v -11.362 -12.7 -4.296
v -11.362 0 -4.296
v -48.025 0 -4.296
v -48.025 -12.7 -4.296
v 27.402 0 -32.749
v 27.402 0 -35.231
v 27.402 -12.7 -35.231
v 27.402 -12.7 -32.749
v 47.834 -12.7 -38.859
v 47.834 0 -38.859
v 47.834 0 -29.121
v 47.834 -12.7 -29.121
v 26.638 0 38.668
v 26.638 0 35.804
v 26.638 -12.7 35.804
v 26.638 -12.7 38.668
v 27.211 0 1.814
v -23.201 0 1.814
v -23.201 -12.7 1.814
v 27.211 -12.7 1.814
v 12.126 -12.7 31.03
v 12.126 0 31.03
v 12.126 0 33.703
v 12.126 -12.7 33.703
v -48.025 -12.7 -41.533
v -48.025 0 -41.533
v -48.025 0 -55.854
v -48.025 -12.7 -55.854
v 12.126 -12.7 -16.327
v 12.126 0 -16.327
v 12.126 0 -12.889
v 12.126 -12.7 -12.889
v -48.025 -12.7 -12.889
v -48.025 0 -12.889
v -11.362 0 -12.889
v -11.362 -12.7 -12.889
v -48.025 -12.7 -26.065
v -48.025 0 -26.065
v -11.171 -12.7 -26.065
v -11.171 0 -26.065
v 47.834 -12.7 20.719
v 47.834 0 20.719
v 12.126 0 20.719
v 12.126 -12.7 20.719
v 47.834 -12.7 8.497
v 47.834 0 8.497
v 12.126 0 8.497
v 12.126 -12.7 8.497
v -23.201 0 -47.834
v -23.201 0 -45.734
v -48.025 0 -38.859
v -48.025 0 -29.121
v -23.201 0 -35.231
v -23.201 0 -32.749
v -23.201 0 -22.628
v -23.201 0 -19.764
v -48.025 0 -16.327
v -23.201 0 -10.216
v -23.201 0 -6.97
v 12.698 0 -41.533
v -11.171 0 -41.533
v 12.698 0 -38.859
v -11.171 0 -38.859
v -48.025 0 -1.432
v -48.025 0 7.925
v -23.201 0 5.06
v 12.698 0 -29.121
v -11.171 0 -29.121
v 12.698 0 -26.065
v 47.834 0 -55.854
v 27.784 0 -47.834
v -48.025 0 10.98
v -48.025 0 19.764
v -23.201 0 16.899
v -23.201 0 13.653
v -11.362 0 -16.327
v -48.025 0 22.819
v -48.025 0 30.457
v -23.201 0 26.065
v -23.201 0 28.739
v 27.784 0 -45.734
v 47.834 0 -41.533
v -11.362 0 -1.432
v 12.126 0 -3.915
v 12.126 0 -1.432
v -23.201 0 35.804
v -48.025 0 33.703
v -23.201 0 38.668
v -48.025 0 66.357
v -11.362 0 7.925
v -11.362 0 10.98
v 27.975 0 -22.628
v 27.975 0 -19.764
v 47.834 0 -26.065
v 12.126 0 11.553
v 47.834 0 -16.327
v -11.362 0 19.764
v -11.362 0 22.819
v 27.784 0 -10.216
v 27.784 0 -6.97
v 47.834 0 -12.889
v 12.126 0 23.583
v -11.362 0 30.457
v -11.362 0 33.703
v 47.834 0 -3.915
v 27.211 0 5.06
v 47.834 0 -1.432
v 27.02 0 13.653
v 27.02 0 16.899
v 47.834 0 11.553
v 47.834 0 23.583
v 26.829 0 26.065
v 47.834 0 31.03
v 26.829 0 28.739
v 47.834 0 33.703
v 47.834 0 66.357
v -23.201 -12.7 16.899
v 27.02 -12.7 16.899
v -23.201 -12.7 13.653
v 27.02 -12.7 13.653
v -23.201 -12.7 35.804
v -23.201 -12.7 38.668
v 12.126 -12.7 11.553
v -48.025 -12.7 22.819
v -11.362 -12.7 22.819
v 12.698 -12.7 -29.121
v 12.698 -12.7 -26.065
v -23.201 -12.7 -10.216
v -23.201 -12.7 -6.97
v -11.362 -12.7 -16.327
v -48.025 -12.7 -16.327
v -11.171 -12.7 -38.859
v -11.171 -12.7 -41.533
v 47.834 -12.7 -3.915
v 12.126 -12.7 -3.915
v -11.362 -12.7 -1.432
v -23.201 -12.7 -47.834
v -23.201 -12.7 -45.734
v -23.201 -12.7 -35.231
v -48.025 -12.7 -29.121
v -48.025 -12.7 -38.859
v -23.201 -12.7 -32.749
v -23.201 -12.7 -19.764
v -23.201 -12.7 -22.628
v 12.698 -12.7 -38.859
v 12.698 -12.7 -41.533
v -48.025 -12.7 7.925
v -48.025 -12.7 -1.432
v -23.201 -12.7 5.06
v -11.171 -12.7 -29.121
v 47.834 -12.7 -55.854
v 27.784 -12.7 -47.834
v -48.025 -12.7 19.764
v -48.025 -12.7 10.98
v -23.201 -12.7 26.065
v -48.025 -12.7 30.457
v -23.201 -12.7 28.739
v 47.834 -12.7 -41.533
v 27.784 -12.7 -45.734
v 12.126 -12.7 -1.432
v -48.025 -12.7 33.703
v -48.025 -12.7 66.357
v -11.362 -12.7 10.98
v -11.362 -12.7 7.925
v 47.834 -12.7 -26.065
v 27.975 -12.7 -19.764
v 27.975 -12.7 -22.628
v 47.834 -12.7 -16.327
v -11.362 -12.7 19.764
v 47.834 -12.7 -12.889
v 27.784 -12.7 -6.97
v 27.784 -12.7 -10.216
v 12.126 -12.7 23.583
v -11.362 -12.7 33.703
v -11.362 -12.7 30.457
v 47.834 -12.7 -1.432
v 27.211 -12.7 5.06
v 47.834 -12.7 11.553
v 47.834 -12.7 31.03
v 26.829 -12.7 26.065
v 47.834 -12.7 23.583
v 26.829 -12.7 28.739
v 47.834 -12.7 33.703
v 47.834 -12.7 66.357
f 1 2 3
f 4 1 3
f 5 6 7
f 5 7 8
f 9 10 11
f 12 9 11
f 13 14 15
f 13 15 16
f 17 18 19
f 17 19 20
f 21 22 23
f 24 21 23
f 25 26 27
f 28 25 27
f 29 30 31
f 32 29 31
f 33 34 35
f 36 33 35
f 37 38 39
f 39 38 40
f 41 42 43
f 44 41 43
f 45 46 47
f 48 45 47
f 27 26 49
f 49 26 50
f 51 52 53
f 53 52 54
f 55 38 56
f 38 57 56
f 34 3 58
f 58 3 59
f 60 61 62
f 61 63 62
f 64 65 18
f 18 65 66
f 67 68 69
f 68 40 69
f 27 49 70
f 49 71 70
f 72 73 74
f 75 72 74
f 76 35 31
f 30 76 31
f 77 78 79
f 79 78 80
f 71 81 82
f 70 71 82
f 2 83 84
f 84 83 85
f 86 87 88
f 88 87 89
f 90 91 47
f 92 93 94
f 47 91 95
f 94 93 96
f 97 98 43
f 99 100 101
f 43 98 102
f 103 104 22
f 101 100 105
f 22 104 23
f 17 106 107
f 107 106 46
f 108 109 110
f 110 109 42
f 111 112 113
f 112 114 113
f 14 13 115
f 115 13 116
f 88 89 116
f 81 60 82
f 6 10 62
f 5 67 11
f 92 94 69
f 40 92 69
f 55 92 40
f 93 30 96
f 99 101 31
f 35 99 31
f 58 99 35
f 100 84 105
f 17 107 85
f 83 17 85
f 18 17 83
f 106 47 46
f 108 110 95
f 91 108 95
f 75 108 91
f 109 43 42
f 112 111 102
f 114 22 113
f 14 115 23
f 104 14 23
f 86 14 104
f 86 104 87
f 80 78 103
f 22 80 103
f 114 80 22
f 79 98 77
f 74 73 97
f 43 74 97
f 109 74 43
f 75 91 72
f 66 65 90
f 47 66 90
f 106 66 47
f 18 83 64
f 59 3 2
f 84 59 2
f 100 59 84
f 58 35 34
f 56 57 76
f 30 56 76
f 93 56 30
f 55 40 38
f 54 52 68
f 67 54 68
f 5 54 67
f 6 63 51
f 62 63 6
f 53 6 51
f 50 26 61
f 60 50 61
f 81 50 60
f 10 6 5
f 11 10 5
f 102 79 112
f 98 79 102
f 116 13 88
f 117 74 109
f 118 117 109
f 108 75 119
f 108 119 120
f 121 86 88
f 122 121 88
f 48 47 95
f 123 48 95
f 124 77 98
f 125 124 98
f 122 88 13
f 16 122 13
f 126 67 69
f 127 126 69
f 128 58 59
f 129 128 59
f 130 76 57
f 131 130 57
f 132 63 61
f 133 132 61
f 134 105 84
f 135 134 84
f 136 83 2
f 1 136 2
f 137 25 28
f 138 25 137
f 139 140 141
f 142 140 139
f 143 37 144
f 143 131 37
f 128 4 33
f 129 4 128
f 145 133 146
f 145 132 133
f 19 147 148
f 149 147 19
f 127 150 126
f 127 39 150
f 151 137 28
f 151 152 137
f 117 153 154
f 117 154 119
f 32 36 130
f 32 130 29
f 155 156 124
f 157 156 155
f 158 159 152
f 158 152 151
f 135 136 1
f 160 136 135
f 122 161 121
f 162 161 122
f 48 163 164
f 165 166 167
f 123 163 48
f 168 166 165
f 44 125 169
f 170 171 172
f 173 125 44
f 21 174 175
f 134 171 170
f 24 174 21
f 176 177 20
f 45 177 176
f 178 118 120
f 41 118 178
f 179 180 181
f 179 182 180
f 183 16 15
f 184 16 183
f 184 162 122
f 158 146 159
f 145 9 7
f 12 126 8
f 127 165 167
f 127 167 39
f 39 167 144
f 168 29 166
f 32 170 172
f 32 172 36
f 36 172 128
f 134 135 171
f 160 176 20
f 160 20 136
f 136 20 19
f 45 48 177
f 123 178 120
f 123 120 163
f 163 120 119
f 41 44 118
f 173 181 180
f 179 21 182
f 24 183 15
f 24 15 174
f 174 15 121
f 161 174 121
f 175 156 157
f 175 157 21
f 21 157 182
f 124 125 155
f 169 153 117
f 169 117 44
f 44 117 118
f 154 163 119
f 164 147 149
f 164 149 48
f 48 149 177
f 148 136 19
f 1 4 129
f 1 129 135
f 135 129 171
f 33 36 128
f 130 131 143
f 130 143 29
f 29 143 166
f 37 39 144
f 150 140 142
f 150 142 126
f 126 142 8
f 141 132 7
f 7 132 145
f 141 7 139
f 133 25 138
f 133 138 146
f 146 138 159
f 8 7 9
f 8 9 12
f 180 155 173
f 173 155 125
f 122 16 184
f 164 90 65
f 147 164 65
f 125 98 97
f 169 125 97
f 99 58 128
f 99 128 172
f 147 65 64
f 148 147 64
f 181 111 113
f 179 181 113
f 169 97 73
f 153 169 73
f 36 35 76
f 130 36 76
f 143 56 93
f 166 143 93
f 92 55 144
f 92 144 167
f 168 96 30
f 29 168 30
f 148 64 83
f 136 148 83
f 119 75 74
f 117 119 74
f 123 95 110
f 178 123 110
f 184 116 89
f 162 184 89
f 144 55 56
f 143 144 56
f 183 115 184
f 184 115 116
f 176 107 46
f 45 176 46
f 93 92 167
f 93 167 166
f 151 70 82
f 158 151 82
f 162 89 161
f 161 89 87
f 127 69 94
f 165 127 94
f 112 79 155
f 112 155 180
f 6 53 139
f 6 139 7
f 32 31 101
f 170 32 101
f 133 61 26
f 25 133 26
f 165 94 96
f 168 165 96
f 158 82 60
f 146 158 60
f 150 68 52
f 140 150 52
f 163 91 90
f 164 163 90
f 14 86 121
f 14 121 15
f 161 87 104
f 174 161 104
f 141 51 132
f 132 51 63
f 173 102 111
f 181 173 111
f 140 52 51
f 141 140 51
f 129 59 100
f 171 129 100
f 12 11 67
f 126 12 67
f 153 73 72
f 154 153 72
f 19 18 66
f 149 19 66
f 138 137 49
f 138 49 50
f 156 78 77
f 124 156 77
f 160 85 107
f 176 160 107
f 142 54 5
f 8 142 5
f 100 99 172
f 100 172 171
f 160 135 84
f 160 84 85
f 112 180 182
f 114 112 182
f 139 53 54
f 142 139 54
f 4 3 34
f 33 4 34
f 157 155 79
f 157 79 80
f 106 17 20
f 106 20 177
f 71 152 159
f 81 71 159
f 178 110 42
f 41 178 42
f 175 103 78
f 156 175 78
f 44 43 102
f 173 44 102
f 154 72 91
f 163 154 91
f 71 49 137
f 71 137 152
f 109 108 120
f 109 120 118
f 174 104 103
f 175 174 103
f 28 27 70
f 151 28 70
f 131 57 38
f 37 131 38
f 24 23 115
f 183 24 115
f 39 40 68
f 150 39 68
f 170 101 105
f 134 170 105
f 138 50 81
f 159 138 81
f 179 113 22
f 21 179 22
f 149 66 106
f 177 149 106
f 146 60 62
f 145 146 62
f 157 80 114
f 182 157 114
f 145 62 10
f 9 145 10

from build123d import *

# Parameters (mm, degrees)
F0_W     = 50.984893
F0_H     = 2.100501
F0_W_2   = 50.602986
F0_H_2   = 2.482414
F0_W_3   = 51.175848
F0_H_3   = 2.86432
F0_H_4   = 3.246229
F0_W_4   = 50.412029
F0_W_5   = 50.221075
F0_W_6   = 50.030118
F0_H_5   = 2.673368
F0_W_7   = 49.839167
F0_H_6   = 2.864324
F1_DEPTH = 12.7


with BuildPart() as f1:
    # F0 (on Front) → F1 (new body)
    with BuildSketch(Plane.XZ):
        Polygon((-48.025098, -41.532639), (-48.025098, -55.854235), (47.834139, -55.854235), (47.834139, -41.532639), (12.698486, -41.532639), (12.698486, -38.859274), (47.834139, -38.859274), (47.834139, -29.120585), (12.698486, -29.120585), (12.698486, -26.06531), (47.834139, -26.06531), (47.834139, -16.326623), (12.125621, -16.326623), (12.125621, -12.889439), (47.834139, -12.889439), (47.834139, -3.91457), (12.125621, -3.91457), (12.125621, -1.43216), (47.834139, -1.43216), (47.834139, 8.497482), (12.125621, 8.497482), (12.125621, 11.552757), (47.834139, 11.552757), (47.834139, 20.71858), (12.125621, 20.71858), (12.125621, 23.5829), (47.834139, 23.5829), (47.834139, 31.030132), (12.125621, 31.030132), (12.125621, 33.703495), (47.834139, 33.703495), (47.834139, 66.356741), (-48.025098, 66.356741), (-48.025098, 33.703495), (-11.361802, 33.703495), (-11.361802, 30.457268), (-48.025098, 30.457268), (-48.025098, 22.819081), (-11.361802, 22.819081), (-11.361802, 19.763807), (-48.025098, 19.763807), (-48.025098, 10.979893), (-11.361802, 10.979893), (-11.361802, 7.924618), (-48.025098, 7.924618), (-48.025098, -1.43216), (-11.361802, -1.43216), (-11.361802, -4.29648), (-48.025098, -4.29648), (-48.025098, -12.889439), (-11.361802, -12.889439), (-11.361802, -16.326623), (-48.025098, -16.326623), (-48.025098, -26.06531), (-11.170847, -26.06531), (-11.170847, -29.120585), (-48.025098, -29.120585), (-48.025098, -38.859274), (-11.170847, -38.859274), (-11.170847, -41.532639), align=None)
        with Locations((2.291455, -46.783892)):
            Rectangle(F0_W, F0_H, mode=Mode.SUBTRACT)
        with Locations((2.100502, -33.989929)):
            Rectangle(F0_W_2, F0_H_2, mode=Mode.SUBTRACT)
        with Locations((2.386933, -21.195967)):
            Rectangle(F0_W_3, F0_H_3, mode=Mode.SUBTRACT)
        with Locations((2.291455, -8.592959)):
            Rectangle(F0_W, F0_H_4, mode=Mode.SUBTRACT)
        with Locations((2.005024, 3.437183)):
            Rectangle(F0_W_4, F0_H_4, mode=Mode.SUBTRACT)
        with Locations((1.909546, 15.276373)):
            Rectangle(F0_W_5, F0_H_4, mode=Mode.SUBTRACT)
        with Locations((1.814068, 27.401994)):
            Rectangle(F0_W_6, F0_H_5, mode=Mode.SUBTRACT)
        with Locations((1.718592, 37.236158)):
            Rectangle(F0_W_7, F0_H_6, mode=Mode.SUBTRACT)
    extrude(amount=F1_DEPTH)


solid = f1.part
